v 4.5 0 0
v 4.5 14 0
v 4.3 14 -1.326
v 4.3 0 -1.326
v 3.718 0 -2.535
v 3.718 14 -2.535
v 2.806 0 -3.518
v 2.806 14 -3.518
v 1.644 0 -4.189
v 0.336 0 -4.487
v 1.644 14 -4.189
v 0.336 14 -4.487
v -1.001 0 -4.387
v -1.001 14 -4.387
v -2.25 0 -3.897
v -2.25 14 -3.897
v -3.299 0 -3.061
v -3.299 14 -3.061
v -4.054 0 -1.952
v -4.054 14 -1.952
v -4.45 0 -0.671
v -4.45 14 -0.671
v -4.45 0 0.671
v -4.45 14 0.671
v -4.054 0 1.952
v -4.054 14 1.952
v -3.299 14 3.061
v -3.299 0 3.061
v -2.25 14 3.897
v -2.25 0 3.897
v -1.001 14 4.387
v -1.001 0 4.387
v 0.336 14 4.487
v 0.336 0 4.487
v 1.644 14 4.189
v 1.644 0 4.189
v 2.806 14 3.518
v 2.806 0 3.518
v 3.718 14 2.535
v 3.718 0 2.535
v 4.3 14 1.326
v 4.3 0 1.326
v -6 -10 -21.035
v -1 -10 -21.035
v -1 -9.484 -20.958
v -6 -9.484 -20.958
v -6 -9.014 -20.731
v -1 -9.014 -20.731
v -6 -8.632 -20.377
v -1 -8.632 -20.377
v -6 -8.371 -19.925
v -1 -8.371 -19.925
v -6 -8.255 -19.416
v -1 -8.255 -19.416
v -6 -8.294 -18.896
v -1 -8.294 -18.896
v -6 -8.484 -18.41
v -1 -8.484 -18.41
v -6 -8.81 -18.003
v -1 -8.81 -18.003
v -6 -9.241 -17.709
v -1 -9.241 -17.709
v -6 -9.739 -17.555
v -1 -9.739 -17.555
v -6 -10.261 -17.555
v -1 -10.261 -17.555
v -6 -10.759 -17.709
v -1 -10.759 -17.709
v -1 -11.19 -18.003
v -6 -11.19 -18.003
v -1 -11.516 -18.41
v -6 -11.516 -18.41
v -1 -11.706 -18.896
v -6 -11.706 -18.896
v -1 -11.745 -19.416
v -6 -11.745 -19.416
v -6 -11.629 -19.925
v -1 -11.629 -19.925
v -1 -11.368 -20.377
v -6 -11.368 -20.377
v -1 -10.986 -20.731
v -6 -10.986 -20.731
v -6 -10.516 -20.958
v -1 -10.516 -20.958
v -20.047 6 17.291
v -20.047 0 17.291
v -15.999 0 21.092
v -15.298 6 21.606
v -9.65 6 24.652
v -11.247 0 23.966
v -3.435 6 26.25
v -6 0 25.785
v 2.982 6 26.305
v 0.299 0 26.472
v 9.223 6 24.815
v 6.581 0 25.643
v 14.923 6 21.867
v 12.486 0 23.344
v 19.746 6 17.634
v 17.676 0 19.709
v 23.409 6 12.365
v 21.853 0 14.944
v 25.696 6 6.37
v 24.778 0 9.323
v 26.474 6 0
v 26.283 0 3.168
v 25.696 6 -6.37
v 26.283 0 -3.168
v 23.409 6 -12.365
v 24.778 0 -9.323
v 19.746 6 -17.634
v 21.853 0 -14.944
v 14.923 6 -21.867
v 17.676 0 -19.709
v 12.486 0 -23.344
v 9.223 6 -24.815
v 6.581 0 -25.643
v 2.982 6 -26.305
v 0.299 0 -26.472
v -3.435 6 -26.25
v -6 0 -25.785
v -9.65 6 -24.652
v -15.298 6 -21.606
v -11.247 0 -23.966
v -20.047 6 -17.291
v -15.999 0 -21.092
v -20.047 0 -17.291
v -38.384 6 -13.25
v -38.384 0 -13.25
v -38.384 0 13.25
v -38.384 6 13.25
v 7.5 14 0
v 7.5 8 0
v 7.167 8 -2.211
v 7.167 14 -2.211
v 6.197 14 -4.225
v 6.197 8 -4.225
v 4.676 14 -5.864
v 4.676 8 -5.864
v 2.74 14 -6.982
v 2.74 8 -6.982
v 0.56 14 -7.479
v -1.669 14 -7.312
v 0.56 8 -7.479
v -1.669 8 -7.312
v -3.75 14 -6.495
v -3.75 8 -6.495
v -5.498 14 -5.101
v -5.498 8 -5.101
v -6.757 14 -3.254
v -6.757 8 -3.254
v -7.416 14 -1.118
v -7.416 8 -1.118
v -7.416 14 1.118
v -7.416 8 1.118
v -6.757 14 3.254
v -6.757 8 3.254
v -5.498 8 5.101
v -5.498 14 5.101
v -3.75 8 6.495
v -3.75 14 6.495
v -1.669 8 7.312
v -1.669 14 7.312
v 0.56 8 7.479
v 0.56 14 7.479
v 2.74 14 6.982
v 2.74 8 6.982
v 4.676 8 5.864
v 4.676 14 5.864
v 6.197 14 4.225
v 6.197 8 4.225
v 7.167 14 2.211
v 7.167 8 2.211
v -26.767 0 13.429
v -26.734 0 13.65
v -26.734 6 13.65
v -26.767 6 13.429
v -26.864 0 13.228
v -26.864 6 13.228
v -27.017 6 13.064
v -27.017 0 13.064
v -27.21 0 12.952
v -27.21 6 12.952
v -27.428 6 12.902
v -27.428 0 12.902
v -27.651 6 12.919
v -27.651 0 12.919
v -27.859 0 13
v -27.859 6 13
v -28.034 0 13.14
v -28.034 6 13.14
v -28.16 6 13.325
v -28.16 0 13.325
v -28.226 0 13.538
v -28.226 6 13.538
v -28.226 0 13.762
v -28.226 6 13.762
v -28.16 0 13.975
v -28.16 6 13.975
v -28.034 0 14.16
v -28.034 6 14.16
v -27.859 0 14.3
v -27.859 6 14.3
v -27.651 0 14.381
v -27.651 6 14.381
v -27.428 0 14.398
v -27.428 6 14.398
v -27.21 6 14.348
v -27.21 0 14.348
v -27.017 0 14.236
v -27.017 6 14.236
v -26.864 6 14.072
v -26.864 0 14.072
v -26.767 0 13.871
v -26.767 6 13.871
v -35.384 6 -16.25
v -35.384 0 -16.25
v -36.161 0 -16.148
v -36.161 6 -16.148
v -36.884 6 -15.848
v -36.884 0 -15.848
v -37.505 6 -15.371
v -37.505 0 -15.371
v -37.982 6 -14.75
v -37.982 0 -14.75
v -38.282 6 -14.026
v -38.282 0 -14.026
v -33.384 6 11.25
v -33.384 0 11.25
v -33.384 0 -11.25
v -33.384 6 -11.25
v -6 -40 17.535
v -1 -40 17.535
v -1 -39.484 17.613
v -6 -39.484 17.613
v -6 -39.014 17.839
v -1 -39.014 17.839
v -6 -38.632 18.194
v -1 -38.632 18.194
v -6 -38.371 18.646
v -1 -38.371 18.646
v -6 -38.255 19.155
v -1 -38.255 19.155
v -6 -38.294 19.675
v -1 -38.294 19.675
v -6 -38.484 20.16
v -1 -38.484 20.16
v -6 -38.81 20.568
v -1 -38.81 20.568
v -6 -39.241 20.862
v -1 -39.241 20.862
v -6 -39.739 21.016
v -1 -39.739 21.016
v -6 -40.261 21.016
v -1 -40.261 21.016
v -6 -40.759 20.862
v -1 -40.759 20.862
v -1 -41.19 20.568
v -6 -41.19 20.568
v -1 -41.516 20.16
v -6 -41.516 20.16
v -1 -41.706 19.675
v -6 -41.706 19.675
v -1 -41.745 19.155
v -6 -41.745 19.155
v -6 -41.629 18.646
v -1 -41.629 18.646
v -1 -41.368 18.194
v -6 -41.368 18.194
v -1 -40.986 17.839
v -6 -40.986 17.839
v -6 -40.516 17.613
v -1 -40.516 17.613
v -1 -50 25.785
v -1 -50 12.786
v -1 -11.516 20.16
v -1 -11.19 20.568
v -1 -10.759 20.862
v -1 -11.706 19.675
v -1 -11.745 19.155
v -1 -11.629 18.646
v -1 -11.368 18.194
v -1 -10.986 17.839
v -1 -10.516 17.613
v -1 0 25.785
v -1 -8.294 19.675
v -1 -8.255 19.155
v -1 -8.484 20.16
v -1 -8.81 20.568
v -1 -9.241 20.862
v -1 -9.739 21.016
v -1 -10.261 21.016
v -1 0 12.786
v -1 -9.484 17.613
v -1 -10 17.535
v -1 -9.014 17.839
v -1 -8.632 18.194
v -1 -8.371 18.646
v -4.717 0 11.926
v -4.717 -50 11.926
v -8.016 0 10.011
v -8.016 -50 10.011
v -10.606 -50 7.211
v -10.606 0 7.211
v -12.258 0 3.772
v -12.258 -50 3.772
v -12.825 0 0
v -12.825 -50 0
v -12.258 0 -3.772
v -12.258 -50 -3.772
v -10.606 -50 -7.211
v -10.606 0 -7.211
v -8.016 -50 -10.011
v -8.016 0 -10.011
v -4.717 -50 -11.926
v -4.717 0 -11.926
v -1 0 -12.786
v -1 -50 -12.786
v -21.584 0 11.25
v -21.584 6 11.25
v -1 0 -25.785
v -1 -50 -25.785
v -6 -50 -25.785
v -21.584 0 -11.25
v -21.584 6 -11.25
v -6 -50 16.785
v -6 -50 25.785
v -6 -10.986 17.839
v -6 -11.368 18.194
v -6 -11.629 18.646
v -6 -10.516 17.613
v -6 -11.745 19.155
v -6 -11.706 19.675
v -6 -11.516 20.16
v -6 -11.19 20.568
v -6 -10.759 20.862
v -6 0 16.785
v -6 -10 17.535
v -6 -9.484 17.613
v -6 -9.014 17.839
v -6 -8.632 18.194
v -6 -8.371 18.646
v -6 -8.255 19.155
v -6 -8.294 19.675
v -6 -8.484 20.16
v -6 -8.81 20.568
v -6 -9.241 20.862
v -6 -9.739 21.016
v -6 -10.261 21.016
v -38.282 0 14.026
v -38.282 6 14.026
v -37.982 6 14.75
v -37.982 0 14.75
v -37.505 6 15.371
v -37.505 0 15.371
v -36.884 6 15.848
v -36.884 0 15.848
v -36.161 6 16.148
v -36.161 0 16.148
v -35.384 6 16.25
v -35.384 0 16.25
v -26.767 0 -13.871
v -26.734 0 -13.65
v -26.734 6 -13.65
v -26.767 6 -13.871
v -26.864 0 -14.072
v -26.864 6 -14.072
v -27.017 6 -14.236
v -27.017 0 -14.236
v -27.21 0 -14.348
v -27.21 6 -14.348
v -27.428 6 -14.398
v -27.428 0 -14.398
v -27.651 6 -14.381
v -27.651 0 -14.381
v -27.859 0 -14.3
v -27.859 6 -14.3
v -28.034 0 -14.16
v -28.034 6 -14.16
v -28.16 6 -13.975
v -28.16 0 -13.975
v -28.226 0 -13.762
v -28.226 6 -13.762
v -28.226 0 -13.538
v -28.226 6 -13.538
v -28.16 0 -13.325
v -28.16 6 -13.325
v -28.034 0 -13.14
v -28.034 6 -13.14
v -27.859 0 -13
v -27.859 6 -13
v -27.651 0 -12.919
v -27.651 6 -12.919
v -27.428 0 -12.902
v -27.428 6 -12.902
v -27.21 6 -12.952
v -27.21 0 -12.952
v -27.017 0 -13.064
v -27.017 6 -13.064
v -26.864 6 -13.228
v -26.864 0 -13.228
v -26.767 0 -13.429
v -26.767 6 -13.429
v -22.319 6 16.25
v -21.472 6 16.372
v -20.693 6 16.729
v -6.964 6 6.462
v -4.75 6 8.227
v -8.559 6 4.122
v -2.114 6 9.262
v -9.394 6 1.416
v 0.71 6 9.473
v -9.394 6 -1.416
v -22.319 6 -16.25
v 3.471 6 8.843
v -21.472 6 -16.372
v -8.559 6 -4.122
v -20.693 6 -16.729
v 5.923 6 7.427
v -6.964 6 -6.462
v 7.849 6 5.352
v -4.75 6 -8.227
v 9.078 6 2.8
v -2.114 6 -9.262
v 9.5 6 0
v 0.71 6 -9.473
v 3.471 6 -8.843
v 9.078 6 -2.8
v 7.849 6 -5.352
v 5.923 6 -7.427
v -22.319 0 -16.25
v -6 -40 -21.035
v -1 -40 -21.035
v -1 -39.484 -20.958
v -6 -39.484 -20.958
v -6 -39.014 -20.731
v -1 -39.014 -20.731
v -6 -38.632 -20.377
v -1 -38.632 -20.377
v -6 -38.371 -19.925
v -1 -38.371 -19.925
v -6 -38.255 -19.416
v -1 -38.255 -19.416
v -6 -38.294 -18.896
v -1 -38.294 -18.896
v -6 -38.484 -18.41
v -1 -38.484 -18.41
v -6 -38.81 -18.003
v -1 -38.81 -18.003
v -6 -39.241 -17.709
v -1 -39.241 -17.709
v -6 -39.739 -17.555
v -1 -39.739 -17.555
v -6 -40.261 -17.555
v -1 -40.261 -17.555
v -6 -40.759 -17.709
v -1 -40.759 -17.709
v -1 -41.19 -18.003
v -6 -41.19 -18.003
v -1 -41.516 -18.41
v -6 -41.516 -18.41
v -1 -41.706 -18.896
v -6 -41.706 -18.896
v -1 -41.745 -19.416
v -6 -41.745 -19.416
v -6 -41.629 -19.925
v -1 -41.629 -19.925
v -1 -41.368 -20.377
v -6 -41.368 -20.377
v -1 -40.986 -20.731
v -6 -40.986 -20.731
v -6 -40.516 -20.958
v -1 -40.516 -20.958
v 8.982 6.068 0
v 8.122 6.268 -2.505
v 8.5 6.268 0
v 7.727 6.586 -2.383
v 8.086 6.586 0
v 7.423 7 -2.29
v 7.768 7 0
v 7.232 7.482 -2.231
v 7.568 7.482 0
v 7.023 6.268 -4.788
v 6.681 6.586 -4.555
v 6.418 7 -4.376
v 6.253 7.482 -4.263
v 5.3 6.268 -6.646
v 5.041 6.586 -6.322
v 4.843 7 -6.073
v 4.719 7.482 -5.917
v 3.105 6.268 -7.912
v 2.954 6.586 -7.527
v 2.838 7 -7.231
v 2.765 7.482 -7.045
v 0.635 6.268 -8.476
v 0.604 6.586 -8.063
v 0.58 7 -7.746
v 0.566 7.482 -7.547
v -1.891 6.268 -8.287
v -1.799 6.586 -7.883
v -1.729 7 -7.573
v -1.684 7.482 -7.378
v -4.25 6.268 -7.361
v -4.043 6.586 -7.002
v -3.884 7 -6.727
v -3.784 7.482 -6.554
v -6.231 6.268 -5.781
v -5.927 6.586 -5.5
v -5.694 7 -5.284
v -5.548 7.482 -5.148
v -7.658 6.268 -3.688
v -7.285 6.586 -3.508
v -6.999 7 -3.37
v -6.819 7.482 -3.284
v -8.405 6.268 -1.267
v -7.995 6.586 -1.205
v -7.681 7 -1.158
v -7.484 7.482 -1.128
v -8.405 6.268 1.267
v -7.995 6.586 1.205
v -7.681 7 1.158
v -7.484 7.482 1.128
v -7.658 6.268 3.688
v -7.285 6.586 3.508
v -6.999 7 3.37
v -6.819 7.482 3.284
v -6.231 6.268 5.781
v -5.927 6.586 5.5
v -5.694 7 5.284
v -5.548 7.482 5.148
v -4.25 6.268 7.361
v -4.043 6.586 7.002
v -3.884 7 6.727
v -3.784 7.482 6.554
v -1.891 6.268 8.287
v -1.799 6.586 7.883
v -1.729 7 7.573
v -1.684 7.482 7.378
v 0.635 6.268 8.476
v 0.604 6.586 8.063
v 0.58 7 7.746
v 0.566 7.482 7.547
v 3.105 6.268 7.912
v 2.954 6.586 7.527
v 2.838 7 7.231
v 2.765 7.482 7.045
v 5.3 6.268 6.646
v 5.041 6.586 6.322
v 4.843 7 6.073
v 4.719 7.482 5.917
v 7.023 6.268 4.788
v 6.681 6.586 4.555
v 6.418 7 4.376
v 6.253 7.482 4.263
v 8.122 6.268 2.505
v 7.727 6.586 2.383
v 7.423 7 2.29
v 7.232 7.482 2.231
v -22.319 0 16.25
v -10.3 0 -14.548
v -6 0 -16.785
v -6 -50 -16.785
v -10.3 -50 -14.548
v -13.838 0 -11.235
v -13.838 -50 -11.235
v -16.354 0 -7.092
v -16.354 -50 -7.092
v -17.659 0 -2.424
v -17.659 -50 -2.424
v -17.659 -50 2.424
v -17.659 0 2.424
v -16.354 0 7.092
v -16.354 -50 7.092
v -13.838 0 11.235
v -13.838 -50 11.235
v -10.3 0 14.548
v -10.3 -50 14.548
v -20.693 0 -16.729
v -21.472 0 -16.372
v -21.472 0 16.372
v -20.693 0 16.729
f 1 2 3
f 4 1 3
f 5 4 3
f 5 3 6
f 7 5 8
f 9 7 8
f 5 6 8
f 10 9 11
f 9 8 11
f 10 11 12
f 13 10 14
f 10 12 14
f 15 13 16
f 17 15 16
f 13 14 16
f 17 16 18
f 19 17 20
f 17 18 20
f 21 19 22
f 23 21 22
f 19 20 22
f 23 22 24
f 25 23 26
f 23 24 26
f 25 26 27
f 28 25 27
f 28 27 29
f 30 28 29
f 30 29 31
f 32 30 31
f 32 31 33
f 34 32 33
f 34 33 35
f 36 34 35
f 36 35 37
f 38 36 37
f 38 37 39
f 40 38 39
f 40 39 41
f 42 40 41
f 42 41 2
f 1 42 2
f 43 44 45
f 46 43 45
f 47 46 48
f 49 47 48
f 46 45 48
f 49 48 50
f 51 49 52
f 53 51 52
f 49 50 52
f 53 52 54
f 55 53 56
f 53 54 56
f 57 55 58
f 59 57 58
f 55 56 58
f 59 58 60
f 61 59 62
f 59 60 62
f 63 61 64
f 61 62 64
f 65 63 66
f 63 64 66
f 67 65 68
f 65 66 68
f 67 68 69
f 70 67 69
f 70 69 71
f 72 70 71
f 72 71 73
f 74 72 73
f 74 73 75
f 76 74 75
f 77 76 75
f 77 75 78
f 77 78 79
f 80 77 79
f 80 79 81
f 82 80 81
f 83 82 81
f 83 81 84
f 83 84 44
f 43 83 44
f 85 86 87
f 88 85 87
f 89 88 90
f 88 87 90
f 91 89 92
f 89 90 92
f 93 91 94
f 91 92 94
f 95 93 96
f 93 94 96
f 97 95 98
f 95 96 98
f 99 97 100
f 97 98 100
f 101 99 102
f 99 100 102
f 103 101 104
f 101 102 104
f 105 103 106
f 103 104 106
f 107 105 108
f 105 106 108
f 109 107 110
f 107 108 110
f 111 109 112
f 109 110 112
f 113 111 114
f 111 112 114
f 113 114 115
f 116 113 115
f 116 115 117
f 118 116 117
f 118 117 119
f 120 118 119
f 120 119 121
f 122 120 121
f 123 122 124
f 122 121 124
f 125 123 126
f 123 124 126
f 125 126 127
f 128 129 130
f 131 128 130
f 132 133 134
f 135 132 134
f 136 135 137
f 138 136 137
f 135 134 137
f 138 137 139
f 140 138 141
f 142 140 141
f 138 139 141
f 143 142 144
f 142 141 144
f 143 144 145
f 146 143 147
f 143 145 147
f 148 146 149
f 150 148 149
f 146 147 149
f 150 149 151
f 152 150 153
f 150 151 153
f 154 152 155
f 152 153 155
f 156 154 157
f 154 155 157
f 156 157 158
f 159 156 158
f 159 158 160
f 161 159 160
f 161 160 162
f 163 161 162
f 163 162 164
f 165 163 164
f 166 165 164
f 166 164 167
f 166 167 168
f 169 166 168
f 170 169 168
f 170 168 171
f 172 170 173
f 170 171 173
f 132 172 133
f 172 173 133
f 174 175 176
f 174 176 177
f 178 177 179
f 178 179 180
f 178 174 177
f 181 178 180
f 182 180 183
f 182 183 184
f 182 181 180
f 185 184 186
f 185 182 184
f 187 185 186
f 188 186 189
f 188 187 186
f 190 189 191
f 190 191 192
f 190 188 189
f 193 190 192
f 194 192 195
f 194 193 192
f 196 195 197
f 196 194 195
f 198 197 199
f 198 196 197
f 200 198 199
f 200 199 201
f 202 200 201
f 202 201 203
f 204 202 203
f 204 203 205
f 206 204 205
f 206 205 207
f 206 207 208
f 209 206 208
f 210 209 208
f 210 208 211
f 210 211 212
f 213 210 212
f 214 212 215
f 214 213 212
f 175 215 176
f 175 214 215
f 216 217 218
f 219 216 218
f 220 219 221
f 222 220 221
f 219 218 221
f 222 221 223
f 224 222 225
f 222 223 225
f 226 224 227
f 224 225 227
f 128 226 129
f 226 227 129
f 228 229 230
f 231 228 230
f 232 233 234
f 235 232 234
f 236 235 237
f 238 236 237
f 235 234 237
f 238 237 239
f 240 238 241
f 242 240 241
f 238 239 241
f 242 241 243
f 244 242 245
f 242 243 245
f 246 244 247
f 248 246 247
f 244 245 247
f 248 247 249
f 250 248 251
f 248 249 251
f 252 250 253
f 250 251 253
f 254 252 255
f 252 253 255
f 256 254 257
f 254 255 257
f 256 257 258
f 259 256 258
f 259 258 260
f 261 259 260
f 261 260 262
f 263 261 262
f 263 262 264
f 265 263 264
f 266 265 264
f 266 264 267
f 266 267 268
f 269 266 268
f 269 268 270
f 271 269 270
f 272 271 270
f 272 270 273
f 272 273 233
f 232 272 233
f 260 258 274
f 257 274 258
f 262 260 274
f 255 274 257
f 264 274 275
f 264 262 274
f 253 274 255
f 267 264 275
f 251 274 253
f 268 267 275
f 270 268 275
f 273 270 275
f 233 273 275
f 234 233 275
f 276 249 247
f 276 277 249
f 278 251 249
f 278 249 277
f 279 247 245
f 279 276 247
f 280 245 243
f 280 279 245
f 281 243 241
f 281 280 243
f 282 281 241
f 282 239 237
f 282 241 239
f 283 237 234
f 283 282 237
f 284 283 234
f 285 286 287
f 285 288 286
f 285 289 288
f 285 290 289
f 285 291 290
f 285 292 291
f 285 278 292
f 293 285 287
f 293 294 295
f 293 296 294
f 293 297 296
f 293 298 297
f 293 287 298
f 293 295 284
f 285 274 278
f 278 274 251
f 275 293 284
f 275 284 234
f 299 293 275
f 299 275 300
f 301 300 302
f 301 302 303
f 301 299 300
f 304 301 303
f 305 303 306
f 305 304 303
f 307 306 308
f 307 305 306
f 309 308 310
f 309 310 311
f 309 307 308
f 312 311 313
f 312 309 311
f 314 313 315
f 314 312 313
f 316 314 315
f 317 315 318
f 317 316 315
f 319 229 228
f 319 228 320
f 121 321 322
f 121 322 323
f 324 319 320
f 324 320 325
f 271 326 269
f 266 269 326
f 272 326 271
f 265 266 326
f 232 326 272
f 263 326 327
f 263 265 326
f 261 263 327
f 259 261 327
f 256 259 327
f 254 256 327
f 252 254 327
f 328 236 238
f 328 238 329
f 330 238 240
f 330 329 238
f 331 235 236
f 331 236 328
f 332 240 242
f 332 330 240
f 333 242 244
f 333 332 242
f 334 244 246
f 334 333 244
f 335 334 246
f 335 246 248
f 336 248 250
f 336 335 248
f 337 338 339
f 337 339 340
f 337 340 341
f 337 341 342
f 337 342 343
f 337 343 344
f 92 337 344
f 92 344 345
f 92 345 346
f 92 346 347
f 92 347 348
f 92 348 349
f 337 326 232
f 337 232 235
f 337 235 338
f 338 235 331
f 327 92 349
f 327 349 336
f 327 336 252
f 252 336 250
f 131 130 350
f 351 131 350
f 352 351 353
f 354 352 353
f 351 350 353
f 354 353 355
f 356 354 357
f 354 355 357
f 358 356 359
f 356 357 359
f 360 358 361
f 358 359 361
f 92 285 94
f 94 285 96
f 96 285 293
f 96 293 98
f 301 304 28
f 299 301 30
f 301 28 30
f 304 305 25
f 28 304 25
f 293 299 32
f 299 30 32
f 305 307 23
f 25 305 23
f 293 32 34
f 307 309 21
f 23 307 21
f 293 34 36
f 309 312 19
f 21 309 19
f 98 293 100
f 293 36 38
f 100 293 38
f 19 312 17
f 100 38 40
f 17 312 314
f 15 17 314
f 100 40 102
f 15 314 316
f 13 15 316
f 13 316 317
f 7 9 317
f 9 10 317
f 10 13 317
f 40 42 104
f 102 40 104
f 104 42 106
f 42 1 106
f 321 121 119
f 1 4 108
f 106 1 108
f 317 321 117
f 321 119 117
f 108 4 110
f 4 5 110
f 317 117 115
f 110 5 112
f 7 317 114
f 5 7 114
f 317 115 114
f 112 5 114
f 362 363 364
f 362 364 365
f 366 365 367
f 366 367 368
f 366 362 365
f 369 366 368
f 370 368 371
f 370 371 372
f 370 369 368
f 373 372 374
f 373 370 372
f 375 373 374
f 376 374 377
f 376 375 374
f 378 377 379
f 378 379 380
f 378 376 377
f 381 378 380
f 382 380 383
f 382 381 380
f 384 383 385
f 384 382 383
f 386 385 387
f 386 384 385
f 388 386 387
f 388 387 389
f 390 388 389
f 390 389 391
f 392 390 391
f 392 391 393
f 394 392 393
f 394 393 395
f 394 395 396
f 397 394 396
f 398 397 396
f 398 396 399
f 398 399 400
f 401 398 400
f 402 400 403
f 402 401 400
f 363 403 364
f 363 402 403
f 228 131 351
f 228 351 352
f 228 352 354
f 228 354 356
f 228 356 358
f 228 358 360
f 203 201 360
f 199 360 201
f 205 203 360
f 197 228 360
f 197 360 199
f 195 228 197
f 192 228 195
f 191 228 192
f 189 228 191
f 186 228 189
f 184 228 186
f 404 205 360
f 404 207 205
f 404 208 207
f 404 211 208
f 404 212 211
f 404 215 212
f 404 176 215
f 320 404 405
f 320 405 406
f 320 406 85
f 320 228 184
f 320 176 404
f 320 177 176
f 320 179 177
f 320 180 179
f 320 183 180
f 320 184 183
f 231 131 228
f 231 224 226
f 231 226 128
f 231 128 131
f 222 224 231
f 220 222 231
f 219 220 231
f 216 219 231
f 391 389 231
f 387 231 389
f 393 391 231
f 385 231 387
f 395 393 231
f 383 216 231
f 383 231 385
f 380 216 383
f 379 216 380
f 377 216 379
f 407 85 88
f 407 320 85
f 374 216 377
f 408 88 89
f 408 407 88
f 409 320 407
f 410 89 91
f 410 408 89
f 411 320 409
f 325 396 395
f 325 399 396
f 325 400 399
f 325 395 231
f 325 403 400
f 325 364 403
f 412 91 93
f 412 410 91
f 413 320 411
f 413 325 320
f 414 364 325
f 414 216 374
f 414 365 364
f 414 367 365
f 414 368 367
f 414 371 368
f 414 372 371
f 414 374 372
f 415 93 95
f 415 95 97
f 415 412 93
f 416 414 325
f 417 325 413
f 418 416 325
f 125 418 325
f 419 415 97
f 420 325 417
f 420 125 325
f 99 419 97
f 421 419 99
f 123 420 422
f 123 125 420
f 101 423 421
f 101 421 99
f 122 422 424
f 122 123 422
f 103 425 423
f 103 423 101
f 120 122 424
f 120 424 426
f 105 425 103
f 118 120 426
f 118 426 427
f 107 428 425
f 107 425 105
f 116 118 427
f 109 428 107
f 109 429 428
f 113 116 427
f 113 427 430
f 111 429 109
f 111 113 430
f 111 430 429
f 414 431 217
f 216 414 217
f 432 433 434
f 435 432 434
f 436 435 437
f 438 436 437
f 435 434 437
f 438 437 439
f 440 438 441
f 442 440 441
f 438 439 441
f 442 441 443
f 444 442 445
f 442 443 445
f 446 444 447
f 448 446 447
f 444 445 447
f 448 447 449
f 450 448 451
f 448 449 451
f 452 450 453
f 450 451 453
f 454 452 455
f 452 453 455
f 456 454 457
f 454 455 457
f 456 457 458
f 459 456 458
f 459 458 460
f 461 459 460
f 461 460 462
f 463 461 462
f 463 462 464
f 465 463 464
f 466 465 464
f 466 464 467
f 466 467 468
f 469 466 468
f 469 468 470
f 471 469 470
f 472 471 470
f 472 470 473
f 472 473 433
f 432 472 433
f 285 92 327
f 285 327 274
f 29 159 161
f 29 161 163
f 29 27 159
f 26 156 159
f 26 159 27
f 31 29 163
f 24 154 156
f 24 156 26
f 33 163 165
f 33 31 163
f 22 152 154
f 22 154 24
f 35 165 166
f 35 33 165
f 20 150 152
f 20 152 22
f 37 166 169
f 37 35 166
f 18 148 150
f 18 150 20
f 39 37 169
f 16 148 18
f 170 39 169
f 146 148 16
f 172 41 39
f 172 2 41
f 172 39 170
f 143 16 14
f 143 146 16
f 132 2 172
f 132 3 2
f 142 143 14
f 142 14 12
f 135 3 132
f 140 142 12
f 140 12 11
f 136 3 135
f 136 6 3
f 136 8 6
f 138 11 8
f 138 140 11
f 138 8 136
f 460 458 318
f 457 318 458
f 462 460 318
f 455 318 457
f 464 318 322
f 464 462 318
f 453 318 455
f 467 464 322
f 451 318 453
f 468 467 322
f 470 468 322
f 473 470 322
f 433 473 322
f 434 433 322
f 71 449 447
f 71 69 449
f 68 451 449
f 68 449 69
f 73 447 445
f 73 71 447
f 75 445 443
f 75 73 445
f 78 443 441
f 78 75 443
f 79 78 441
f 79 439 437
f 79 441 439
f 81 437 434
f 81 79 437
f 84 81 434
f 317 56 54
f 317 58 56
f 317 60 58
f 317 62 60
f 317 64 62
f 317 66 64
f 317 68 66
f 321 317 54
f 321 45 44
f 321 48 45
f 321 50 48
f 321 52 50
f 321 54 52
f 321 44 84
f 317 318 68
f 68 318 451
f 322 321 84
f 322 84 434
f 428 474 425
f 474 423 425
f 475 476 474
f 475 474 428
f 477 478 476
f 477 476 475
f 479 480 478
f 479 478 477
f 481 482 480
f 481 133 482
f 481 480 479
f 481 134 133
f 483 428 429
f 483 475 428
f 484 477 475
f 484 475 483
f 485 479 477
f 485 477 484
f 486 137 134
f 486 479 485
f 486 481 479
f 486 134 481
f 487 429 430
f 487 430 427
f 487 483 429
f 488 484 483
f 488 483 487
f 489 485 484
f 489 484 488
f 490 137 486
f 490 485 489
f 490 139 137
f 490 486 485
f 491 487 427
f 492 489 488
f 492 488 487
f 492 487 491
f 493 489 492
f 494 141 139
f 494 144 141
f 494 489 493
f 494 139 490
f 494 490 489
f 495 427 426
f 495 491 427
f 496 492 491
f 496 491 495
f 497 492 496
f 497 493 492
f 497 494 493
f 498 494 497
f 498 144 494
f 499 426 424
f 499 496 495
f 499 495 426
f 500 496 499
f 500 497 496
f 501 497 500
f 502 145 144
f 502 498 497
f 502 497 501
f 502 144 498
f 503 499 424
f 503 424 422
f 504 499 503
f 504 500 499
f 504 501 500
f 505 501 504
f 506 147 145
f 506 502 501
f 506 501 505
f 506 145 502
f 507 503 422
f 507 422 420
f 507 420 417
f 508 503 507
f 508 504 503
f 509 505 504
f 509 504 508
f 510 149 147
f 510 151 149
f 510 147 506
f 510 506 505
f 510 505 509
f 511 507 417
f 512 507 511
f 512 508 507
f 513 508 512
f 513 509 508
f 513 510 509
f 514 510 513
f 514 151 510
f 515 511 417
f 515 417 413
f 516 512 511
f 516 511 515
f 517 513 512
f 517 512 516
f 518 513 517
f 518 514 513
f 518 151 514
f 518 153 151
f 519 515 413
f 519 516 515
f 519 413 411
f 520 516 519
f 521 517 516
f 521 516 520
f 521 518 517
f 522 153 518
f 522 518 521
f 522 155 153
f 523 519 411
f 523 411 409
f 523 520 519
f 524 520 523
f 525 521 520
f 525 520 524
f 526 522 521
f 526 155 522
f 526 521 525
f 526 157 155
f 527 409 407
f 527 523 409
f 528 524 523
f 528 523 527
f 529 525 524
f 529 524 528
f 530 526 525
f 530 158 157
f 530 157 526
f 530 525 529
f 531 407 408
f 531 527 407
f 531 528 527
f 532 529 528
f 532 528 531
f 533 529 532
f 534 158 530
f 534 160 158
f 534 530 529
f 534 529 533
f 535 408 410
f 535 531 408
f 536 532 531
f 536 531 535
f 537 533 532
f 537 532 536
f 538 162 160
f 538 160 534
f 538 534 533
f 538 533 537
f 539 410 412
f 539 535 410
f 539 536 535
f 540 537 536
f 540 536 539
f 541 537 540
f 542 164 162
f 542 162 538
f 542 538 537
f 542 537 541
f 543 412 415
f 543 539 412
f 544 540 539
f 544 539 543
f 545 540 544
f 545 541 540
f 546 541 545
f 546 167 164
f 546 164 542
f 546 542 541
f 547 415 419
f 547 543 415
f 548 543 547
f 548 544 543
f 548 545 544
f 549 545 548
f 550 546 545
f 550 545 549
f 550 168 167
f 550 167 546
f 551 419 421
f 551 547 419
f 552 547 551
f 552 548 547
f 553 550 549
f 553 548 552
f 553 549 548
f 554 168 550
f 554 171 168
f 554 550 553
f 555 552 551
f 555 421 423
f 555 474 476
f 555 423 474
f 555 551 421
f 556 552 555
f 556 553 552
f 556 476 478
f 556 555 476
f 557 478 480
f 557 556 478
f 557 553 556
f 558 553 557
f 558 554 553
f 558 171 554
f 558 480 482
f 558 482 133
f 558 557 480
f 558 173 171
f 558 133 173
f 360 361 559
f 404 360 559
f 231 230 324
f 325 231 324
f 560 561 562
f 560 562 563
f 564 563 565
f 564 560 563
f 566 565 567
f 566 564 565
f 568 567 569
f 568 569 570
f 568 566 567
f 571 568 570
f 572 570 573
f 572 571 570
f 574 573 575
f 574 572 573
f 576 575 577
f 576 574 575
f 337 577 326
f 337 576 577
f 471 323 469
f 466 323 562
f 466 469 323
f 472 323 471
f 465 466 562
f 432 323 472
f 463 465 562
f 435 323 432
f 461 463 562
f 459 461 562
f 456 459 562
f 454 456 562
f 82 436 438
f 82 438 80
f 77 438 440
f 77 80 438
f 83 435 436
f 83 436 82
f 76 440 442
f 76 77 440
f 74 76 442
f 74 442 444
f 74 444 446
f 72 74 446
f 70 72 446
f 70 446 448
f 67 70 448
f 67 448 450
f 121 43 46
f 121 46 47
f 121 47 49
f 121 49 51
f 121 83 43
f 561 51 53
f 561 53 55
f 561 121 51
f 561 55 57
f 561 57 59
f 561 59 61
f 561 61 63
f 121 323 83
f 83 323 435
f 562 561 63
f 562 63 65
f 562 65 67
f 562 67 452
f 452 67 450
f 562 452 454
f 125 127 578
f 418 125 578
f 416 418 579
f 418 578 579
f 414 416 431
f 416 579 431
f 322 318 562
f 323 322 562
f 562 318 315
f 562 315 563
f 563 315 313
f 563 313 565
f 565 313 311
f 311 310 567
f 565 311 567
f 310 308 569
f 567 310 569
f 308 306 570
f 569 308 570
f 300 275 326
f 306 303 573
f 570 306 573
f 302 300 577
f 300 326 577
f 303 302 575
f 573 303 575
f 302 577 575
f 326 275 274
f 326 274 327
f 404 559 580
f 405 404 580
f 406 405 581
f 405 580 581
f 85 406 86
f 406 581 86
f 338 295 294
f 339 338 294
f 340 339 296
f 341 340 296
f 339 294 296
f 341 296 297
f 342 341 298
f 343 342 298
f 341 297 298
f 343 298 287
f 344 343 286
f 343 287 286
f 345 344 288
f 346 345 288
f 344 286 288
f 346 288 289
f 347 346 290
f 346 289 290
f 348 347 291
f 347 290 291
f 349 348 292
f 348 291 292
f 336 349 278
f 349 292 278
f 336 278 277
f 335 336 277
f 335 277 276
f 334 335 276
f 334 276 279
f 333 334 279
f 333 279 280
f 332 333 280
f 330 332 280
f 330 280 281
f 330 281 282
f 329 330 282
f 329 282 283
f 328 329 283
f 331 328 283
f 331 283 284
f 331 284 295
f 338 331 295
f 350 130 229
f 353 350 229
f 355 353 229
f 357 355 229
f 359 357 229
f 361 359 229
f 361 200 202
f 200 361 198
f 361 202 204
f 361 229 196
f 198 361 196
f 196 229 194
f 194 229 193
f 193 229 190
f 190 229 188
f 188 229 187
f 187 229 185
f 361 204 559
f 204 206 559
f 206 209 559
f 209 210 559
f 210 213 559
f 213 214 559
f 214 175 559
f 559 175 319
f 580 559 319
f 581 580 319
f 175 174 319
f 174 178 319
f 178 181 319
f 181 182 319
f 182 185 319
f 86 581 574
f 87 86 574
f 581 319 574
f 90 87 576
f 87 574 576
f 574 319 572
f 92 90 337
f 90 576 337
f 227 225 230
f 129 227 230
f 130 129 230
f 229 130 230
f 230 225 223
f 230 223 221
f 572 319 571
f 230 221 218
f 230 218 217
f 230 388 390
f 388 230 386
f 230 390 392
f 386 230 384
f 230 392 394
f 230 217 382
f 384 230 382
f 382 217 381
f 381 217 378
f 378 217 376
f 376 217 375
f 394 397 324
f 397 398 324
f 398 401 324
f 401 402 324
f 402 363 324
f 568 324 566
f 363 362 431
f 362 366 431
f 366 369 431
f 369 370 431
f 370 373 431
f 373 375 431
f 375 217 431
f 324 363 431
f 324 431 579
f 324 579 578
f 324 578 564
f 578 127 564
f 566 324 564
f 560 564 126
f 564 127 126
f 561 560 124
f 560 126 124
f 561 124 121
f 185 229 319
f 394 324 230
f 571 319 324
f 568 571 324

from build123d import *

# Parameters (mm, degrees)
BOSS_EXTRUDE4_DEPTH = 50
SKETCH7_R           = 1.75
CUT_EXTRUDE1_DEPTH  = 17.825
SKETCH8_R           = 0.75
SKETCH8_W           = 11.8
SKETCH8_H           = 22.5
BOSS_EXTRUDE5_DEPTH = 6
SKETCH9_R           = 7.5
BOSS_EXTRUDE6_DEPTH = 8
FILLET1_R           = 2
SKETCH10_R          = 4.5
CUT_EXTRUDE2_DEPTH  = 65


with BuildPart() as part:
    # Sketch6 → Boss-Extrude4 (new body)
    with BuildSketch(Plane.XZ):
        with BuildLine():
            Line((-1, 25.784833184), (-1, 12.785954208))
            ThreePointArc((-1, 12.785954208), (-12.825, 0), (-1, -12.785954208))
            Line((-1, -12.785954208), (-1, -25.784833184))
            Line((-1, -25.784833184), (-6, -25.784833184))
            Line((-6, -25.784833184), (-6, -16.784833184))
            ThreePointArc((-6, -16.784833184), (-17.825, 0), (-6, 16.784833184))
            Line((-6, 16.784833184), (-6, 25.784833184))
            Line((-6, 25.784833184), (-1, 25.784833184))
        make_face()
    extrude(amount=BOSS_EXTRUDE4_DEPTH)

    # Sketch7 → Cut-Extrude1 (cut, through all)
    with BuildSketch(Plane(origin=(-1, 0, 0), x_dir=(0, 0, -1), z_dir=(1, 0, 0))):
        with Locations((-19.285393696, -10)):
            Circle(SKETCH7_R)
        with Locations((-19.285393696, -40)):
            Circle(SKETCH7_R)
        with Locations((19.285393696, -40)):
            Circle(SKETCH7_R)
        with Locations((19.285393696, -10)):
            Circle(SKETCH7_R)
    extrude(amount=-CUT_EXTRUDE1_DEPTH, mode=Mode.SUBTRACT)

    # Sketch8 → Boss-Extrude5 (add)
    with BuildSketch(Plane(origin=(0, 0, 0), x_dir=(1, 0, 0), z_dir=(0, 1, 0))):
        with BuildLine():
            Line((-35.384131785, -16.25), (-22.318992281, -16.25))
            ThreePointArc((-22.318992281, -16.25), (-21.069616181, -16.522536094), (-20.047240136, -17.290627093))
            ThreePointArc((-20.047240136, -17.290627093), (26.473715688, 0), (-20.047240136, 17.290627093))
            ThreePointArc((-20.047240136, 17.290627093), (-21.069616181, 16.522536094), (-22.318992281, 16.25))
            Line((-22.318992281, 16.25), (-35.384131785, 16.25))
            ThreePointArc((-35.384131785, 16.25), (-37.505452129, 15.371320344), (-38.384131785, 13.25))
            Line((-38.384131785, 13.25), (-38.384131785, -13.25))
            ThreePointArc((-38.384131785, -13.25), (-37.505452129, -15.371320344), (-35.384131785, -16.25))
        make_face()
        with Locations((-27.484131785, 13.65)):
            Circle(SKETCH8_R, mode=Mode.SUBTRACT)
        with Locations((-27.484131785, -13.65)):
            Circle(SKETCH8_R, mode=Mode.SUBTRACT)
        with Locations((-27.484131785, 0)):
            Rectangle(SKETCH8_W, SKETCH8_H, mode=Mode.SUBTRACT)
    extrude(amount=BOSS_EXTRUDE5_DEPTH)

    # Sketch9 → Boss-Extrude6 (add)
    with BuildSketch(Plane(origin=(0, 6, 0), x_dir=(1, 0, 0), z_dir=(0, 1, 0))):
        Circle(SKETCH9_R)
    extrude(amount=BOSS_EXTRUDE6_DEPTH)

    # Fillet1
    fillet1_edges = [part.edges().sort_by_distance(p)[0] for p in [
        (-7.5, 6, 0),
    ]]
    fillet(fillet1_edges, radius=FILLET1_R)

    # Sketch10 → Cut-Extrude2 (cut, through all)
    with BuildSketch(Plane(origin=(0, 14, 0), x_dir=(1, 0, 0), z_dir=(0, 1, 0))):
        Circle(SKETCH10_R)
    extrude(amount=-CUT_EXTRUDE2_DEPTH, mode=Mode.SUBTRACT)


solid = part.part
